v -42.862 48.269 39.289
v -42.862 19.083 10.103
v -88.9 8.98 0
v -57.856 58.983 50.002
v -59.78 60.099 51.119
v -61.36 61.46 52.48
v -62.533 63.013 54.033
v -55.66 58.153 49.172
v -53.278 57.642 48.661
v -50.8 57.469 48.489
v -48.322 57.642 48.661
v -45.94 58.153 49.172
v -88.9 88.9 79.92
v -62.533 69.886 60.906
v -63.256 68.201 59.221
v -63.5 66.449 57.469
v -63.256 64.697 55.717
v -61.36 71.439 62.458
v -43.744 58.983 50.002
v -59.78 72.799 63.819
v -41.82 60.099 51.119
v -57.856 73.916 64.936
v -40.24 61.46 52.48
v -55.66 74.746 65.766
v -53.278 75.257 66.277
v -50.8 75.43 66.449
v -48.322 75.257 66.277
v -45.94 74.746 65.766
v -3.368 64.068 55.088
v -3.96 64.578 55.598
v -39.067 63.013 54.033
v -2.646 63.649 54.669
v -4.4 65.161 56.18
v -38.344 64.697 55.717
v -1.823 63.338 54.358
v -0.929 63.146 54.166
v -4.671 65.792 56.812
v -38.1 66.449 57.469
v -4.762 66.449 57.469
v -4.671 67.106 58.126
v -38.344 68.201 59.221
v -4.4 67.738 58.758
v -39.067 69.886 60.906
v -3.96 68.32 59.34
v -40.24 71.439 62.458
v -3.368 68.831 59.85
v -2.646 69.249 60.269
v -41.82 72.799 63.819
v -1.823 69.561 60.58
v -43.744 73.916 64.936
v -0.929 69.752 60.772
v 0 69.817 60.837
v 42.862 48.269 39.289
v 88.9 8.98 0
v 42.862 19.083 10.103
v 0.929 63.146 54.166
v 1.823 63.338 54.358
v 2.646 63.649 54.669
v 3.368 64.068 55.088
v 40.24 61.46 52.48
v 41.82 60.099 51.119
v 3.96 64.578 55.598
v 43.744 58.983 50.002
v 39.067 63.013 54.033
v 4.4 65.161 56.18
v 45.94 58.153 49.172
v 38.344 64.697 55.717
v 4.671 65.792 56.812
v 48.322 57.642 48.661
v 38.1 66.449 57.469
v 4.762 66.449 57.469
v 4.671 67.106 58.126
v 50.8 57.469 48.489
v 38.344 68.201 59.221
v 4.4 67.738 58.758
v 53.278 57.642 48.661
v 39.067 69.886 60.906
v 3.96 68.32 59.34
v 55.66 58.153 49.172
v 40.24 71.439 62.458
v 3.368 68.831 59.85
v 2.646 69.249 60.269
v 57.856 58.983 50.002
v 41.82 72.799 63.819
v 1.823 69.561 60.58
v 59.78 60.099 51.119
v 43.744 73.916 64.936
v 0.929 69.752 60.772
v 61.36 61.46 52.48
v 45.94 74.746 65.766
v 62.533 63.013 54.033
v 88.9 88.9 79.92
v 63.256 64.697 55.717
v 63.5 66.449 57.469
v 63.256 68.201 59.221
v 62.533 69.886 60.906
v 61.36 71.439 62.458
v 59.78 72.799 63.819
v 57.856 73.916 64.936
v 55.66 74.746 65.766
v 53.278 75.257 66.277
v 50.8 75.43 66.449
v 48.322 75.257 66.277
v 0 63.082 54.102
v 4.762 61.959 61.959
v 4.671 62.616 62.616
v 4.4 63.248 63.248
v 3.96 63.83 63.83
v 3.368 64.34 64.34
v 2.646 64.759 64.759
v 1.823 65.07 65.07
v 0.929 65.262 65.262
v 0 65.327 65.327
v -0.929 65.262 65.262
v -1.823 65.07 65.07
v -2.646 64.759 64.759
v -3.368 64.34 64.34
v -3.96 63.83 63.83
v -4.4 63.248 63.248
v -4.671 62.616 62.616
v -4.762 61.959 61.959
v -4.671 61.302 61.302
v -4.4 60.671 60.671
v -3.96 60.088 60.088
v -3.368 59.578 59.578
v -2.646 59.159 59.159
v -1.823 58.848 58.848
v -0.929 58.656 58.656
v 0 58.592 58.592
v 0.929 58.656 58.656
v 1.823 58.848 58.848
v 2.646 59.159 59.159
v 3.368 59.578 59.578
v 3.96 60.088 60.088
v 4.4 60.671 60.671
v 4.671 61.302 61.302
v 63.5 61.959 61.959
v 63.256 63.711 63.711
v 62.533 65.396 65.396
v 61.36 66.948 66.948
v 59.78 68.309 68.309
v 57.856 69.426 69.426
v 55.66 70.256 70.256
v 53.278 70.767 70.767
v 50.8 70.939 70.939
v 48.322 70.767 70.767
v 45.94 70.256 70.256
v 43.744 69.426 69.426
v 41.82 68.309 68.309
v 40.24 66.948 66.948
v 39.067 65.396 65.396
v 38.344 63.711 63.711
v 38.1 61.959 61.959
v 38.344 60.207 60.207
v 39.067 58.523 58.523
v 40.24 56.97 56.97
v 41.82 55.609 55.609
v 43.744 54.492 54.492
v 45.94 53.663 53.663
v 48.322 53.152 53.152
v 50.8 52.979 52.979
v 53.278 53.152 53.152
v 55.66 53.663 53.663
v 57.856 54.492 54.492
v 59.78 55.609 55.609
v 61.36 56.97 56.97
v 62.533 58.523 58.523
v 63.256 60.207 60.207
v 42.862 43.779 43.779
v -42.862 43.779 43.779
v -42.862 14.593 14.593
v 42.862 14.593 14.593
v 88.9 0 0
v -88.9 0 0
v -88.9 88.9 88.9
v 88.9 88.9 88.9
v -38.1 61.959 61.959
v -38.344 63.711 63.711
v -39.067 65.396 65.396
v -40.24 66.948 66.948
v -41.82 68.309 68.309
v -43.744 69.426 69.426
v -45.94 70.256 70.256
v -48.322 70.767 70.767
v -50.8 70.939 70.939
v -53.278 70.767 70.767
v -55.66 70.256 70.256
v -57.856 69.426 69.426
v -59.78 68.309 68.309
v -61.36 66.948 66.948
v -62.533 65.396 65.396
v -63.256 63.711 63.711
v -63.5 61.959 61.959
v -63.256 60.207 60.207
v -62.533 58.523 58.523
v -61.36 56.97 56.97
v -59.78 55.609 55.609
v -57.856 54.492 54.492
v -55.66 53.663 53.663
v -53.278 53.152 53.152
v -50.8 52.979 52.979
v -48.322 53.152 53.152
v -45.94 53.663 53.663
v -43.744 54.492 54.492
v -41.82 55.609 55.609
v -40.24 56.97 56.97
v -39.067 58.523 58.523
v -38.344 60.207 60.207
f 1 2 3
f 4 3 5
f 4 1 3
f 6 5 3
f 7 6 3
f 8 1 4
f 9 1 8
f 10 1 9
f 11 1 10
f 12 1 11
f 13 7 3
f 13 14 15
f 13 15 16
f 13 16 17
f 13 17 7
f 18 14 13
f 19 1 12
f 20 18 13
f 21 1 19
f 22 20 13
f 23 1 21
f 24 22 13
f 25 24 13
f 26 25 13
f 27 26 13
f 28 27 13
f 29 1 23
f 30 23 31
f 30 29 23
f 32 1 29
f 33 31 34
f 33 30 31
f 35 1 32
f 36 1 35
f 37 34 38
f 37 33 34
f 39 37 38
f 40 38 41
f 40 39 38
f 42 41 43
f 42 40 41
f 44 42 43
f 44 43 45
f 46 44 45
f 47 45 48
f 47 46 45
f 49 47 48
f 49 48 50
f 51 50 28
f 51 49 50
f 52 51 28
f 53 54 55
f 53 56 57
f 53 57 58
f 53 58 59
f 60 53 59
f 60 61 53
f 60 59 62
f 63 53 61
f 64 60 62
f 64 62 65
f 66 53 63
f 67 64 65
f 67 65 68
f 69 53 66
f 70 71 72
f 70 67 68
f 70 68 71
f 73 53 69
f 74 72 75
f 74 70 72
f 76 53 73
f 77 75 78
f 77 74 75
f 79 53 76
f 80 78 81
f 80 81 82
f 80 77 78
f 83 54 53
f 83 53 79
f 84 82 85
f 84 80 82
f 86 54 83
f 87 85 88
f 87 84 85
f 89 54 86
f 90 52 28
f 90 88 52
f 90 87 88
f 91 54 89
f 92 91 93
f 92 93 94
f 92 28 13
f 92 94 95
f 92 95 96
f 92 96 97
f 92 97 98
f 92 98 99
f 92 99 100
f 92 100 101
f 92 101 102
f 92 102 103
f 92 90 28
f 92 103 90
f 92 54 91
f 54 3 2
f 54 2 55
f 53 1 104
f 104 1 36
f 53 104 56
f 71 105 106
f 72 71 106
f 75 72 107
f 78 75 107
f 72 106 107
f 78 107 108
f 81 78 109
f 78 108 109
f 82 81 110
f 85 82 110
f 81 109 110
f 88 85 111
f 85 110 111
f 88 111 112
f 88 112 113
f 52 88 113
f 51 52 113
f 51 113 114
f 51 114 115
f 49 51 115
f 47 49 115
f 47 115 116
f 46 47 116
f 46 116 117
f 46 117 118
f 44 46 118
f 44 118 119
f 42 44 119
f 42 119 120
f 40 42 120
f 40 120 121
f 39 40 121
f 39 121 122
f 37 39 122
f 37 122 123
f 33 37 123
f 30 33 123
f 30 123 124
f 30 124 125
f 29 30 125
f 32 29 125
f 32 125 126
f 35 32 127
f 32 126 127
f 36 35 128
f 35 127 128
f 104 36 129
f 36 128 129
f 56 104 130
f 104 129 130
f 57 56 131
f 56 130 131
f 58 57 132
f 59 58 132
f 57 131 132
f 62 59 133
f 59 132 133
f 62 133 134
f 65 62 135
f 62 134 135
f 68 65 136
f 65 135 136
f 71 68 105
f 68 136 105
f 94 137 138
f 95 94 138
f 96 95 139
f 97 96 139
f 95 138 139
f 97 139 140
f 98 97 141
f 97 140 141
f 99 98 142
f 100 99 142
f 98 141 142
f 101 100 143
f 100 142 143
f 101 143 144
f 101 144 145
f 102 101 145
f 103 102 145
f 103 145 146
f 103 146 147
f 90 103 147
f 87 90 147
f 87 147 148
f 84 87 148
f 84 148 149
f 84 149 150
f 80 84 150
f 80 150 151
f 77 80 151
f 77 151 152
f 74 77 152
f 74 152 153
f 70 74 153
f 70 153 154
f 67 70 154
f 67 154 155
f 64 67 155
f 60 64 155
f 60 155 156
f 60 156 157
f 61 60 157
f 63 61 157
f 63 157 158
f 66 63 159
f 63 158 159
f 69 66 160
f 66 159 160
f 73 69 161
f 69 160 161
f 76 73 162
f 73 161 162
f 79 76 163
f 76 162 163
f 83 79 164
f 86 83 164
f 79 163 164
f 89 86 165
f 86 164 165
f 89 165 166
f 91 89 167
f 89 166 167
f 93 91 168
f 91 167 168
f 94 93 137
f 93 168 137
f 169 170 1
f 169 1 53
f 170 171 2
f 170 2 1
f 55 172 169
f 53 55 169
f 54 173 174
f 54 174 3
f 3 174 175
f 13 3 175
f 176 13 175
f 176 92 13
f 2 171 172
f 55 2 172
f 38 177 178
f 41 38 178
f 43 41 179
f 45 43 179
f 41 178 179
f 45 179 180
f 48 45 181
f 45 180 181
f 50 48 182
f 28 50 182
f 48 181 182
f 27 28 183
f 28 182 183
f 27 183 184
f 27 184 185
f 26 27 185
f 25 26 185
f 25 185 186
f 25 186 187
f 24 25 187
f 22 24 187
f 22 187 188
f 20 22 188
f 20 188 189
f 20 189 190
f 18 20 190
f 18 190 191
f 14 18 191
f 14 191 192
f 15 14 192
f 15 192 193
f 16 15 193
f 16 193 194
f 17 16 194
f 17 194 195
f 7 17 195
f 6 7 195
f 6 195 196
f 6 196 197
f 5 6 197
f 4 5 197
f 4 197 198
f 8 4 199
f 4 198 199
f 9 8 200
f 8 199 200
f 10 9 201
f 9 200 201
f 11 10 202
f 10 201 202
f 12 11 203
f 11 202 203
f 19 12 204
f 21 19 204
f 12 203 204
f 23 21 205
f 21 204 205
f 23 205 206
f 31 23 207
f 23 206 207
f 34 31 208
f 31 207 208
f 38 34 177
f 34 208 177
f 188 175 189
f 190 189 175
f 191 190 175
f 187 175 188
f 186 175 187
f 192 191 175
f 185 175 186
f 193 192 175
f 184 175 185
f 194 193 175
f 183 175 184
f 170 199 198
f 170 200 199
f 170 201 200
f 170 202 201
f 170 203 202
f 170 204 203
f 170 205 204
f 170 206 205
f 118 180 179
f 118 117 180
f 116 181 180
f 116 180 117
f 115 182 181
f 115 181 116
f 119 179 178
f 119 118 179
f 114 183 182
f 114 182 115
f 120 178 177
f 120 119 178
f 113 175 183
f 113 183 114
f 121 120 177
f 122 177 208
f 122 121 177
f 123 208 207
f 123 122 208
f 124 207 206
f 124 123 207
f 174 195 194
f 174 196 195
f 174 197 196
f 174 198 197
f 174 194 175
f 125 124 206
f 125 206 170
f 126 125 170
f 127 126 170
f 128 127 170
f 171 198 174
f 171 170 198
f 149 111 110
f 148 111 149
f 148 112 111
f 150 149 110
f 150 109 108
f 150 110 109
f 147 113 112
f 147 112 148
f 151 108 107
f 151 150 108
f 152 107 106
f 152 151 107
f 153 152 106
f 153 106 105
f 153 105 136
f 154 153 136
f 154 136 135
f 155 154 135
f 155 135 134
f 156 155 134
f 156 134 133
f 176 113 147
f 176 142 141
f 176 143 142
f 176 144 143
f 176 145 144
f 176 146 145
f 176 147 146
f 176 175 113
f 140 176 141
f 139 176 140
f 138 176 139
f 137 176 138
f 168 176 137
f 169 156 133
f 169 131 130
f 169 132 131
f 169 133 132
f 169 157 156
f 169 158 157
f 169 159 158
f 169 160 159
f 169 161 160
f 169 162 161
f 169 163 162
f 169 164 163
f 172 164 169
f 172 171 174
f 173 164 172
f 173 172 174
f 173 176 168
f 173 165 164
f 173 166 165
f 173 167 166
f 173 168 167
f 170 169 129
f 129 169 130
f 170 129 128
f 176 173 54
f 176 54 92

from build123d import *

# Parameters (mm, degrees)
F1_DEPTH = 88.9
F2_R     = 12.7
F2_W     = 85.725
F2_H     = 41.275
F2_R_2   = 4.7625
F3_DEPTH = 62.862793


with BuildPart() as f1:
    # F0 (on Right) → F1 (new body, symmetric)
    with BuildSketch(Plane.YZ):
        Polygon((88.9, 88.9), (0, 0), (8.980256, 0), (88.9, 79.919744), align=None)
    extrude(amount=F1_DEPTH, both=True)

    # F2 (on face) → F3 (cut, through all)
    with BuildSketch(Plane(origin=(0, 0, 0), x_dir=(1, 0, 0), z_dir=(0, -0.707107, 0.707107))):
        with Locations((50.8, 87.623586)):
            Circle(F2_R)
        with Locations((-50.8, 87.623586)):
            Circle(F2_R)
        with Locations((0, 41.275)):
            Rectangle(F2_W, F2_H)
        with Locations((0, 87.623586)):
            Circle(F2_R_2)
    extrude(amount=-F3_DEPTH, mode=Mode.SUBTRACT)


solid = f1.part
